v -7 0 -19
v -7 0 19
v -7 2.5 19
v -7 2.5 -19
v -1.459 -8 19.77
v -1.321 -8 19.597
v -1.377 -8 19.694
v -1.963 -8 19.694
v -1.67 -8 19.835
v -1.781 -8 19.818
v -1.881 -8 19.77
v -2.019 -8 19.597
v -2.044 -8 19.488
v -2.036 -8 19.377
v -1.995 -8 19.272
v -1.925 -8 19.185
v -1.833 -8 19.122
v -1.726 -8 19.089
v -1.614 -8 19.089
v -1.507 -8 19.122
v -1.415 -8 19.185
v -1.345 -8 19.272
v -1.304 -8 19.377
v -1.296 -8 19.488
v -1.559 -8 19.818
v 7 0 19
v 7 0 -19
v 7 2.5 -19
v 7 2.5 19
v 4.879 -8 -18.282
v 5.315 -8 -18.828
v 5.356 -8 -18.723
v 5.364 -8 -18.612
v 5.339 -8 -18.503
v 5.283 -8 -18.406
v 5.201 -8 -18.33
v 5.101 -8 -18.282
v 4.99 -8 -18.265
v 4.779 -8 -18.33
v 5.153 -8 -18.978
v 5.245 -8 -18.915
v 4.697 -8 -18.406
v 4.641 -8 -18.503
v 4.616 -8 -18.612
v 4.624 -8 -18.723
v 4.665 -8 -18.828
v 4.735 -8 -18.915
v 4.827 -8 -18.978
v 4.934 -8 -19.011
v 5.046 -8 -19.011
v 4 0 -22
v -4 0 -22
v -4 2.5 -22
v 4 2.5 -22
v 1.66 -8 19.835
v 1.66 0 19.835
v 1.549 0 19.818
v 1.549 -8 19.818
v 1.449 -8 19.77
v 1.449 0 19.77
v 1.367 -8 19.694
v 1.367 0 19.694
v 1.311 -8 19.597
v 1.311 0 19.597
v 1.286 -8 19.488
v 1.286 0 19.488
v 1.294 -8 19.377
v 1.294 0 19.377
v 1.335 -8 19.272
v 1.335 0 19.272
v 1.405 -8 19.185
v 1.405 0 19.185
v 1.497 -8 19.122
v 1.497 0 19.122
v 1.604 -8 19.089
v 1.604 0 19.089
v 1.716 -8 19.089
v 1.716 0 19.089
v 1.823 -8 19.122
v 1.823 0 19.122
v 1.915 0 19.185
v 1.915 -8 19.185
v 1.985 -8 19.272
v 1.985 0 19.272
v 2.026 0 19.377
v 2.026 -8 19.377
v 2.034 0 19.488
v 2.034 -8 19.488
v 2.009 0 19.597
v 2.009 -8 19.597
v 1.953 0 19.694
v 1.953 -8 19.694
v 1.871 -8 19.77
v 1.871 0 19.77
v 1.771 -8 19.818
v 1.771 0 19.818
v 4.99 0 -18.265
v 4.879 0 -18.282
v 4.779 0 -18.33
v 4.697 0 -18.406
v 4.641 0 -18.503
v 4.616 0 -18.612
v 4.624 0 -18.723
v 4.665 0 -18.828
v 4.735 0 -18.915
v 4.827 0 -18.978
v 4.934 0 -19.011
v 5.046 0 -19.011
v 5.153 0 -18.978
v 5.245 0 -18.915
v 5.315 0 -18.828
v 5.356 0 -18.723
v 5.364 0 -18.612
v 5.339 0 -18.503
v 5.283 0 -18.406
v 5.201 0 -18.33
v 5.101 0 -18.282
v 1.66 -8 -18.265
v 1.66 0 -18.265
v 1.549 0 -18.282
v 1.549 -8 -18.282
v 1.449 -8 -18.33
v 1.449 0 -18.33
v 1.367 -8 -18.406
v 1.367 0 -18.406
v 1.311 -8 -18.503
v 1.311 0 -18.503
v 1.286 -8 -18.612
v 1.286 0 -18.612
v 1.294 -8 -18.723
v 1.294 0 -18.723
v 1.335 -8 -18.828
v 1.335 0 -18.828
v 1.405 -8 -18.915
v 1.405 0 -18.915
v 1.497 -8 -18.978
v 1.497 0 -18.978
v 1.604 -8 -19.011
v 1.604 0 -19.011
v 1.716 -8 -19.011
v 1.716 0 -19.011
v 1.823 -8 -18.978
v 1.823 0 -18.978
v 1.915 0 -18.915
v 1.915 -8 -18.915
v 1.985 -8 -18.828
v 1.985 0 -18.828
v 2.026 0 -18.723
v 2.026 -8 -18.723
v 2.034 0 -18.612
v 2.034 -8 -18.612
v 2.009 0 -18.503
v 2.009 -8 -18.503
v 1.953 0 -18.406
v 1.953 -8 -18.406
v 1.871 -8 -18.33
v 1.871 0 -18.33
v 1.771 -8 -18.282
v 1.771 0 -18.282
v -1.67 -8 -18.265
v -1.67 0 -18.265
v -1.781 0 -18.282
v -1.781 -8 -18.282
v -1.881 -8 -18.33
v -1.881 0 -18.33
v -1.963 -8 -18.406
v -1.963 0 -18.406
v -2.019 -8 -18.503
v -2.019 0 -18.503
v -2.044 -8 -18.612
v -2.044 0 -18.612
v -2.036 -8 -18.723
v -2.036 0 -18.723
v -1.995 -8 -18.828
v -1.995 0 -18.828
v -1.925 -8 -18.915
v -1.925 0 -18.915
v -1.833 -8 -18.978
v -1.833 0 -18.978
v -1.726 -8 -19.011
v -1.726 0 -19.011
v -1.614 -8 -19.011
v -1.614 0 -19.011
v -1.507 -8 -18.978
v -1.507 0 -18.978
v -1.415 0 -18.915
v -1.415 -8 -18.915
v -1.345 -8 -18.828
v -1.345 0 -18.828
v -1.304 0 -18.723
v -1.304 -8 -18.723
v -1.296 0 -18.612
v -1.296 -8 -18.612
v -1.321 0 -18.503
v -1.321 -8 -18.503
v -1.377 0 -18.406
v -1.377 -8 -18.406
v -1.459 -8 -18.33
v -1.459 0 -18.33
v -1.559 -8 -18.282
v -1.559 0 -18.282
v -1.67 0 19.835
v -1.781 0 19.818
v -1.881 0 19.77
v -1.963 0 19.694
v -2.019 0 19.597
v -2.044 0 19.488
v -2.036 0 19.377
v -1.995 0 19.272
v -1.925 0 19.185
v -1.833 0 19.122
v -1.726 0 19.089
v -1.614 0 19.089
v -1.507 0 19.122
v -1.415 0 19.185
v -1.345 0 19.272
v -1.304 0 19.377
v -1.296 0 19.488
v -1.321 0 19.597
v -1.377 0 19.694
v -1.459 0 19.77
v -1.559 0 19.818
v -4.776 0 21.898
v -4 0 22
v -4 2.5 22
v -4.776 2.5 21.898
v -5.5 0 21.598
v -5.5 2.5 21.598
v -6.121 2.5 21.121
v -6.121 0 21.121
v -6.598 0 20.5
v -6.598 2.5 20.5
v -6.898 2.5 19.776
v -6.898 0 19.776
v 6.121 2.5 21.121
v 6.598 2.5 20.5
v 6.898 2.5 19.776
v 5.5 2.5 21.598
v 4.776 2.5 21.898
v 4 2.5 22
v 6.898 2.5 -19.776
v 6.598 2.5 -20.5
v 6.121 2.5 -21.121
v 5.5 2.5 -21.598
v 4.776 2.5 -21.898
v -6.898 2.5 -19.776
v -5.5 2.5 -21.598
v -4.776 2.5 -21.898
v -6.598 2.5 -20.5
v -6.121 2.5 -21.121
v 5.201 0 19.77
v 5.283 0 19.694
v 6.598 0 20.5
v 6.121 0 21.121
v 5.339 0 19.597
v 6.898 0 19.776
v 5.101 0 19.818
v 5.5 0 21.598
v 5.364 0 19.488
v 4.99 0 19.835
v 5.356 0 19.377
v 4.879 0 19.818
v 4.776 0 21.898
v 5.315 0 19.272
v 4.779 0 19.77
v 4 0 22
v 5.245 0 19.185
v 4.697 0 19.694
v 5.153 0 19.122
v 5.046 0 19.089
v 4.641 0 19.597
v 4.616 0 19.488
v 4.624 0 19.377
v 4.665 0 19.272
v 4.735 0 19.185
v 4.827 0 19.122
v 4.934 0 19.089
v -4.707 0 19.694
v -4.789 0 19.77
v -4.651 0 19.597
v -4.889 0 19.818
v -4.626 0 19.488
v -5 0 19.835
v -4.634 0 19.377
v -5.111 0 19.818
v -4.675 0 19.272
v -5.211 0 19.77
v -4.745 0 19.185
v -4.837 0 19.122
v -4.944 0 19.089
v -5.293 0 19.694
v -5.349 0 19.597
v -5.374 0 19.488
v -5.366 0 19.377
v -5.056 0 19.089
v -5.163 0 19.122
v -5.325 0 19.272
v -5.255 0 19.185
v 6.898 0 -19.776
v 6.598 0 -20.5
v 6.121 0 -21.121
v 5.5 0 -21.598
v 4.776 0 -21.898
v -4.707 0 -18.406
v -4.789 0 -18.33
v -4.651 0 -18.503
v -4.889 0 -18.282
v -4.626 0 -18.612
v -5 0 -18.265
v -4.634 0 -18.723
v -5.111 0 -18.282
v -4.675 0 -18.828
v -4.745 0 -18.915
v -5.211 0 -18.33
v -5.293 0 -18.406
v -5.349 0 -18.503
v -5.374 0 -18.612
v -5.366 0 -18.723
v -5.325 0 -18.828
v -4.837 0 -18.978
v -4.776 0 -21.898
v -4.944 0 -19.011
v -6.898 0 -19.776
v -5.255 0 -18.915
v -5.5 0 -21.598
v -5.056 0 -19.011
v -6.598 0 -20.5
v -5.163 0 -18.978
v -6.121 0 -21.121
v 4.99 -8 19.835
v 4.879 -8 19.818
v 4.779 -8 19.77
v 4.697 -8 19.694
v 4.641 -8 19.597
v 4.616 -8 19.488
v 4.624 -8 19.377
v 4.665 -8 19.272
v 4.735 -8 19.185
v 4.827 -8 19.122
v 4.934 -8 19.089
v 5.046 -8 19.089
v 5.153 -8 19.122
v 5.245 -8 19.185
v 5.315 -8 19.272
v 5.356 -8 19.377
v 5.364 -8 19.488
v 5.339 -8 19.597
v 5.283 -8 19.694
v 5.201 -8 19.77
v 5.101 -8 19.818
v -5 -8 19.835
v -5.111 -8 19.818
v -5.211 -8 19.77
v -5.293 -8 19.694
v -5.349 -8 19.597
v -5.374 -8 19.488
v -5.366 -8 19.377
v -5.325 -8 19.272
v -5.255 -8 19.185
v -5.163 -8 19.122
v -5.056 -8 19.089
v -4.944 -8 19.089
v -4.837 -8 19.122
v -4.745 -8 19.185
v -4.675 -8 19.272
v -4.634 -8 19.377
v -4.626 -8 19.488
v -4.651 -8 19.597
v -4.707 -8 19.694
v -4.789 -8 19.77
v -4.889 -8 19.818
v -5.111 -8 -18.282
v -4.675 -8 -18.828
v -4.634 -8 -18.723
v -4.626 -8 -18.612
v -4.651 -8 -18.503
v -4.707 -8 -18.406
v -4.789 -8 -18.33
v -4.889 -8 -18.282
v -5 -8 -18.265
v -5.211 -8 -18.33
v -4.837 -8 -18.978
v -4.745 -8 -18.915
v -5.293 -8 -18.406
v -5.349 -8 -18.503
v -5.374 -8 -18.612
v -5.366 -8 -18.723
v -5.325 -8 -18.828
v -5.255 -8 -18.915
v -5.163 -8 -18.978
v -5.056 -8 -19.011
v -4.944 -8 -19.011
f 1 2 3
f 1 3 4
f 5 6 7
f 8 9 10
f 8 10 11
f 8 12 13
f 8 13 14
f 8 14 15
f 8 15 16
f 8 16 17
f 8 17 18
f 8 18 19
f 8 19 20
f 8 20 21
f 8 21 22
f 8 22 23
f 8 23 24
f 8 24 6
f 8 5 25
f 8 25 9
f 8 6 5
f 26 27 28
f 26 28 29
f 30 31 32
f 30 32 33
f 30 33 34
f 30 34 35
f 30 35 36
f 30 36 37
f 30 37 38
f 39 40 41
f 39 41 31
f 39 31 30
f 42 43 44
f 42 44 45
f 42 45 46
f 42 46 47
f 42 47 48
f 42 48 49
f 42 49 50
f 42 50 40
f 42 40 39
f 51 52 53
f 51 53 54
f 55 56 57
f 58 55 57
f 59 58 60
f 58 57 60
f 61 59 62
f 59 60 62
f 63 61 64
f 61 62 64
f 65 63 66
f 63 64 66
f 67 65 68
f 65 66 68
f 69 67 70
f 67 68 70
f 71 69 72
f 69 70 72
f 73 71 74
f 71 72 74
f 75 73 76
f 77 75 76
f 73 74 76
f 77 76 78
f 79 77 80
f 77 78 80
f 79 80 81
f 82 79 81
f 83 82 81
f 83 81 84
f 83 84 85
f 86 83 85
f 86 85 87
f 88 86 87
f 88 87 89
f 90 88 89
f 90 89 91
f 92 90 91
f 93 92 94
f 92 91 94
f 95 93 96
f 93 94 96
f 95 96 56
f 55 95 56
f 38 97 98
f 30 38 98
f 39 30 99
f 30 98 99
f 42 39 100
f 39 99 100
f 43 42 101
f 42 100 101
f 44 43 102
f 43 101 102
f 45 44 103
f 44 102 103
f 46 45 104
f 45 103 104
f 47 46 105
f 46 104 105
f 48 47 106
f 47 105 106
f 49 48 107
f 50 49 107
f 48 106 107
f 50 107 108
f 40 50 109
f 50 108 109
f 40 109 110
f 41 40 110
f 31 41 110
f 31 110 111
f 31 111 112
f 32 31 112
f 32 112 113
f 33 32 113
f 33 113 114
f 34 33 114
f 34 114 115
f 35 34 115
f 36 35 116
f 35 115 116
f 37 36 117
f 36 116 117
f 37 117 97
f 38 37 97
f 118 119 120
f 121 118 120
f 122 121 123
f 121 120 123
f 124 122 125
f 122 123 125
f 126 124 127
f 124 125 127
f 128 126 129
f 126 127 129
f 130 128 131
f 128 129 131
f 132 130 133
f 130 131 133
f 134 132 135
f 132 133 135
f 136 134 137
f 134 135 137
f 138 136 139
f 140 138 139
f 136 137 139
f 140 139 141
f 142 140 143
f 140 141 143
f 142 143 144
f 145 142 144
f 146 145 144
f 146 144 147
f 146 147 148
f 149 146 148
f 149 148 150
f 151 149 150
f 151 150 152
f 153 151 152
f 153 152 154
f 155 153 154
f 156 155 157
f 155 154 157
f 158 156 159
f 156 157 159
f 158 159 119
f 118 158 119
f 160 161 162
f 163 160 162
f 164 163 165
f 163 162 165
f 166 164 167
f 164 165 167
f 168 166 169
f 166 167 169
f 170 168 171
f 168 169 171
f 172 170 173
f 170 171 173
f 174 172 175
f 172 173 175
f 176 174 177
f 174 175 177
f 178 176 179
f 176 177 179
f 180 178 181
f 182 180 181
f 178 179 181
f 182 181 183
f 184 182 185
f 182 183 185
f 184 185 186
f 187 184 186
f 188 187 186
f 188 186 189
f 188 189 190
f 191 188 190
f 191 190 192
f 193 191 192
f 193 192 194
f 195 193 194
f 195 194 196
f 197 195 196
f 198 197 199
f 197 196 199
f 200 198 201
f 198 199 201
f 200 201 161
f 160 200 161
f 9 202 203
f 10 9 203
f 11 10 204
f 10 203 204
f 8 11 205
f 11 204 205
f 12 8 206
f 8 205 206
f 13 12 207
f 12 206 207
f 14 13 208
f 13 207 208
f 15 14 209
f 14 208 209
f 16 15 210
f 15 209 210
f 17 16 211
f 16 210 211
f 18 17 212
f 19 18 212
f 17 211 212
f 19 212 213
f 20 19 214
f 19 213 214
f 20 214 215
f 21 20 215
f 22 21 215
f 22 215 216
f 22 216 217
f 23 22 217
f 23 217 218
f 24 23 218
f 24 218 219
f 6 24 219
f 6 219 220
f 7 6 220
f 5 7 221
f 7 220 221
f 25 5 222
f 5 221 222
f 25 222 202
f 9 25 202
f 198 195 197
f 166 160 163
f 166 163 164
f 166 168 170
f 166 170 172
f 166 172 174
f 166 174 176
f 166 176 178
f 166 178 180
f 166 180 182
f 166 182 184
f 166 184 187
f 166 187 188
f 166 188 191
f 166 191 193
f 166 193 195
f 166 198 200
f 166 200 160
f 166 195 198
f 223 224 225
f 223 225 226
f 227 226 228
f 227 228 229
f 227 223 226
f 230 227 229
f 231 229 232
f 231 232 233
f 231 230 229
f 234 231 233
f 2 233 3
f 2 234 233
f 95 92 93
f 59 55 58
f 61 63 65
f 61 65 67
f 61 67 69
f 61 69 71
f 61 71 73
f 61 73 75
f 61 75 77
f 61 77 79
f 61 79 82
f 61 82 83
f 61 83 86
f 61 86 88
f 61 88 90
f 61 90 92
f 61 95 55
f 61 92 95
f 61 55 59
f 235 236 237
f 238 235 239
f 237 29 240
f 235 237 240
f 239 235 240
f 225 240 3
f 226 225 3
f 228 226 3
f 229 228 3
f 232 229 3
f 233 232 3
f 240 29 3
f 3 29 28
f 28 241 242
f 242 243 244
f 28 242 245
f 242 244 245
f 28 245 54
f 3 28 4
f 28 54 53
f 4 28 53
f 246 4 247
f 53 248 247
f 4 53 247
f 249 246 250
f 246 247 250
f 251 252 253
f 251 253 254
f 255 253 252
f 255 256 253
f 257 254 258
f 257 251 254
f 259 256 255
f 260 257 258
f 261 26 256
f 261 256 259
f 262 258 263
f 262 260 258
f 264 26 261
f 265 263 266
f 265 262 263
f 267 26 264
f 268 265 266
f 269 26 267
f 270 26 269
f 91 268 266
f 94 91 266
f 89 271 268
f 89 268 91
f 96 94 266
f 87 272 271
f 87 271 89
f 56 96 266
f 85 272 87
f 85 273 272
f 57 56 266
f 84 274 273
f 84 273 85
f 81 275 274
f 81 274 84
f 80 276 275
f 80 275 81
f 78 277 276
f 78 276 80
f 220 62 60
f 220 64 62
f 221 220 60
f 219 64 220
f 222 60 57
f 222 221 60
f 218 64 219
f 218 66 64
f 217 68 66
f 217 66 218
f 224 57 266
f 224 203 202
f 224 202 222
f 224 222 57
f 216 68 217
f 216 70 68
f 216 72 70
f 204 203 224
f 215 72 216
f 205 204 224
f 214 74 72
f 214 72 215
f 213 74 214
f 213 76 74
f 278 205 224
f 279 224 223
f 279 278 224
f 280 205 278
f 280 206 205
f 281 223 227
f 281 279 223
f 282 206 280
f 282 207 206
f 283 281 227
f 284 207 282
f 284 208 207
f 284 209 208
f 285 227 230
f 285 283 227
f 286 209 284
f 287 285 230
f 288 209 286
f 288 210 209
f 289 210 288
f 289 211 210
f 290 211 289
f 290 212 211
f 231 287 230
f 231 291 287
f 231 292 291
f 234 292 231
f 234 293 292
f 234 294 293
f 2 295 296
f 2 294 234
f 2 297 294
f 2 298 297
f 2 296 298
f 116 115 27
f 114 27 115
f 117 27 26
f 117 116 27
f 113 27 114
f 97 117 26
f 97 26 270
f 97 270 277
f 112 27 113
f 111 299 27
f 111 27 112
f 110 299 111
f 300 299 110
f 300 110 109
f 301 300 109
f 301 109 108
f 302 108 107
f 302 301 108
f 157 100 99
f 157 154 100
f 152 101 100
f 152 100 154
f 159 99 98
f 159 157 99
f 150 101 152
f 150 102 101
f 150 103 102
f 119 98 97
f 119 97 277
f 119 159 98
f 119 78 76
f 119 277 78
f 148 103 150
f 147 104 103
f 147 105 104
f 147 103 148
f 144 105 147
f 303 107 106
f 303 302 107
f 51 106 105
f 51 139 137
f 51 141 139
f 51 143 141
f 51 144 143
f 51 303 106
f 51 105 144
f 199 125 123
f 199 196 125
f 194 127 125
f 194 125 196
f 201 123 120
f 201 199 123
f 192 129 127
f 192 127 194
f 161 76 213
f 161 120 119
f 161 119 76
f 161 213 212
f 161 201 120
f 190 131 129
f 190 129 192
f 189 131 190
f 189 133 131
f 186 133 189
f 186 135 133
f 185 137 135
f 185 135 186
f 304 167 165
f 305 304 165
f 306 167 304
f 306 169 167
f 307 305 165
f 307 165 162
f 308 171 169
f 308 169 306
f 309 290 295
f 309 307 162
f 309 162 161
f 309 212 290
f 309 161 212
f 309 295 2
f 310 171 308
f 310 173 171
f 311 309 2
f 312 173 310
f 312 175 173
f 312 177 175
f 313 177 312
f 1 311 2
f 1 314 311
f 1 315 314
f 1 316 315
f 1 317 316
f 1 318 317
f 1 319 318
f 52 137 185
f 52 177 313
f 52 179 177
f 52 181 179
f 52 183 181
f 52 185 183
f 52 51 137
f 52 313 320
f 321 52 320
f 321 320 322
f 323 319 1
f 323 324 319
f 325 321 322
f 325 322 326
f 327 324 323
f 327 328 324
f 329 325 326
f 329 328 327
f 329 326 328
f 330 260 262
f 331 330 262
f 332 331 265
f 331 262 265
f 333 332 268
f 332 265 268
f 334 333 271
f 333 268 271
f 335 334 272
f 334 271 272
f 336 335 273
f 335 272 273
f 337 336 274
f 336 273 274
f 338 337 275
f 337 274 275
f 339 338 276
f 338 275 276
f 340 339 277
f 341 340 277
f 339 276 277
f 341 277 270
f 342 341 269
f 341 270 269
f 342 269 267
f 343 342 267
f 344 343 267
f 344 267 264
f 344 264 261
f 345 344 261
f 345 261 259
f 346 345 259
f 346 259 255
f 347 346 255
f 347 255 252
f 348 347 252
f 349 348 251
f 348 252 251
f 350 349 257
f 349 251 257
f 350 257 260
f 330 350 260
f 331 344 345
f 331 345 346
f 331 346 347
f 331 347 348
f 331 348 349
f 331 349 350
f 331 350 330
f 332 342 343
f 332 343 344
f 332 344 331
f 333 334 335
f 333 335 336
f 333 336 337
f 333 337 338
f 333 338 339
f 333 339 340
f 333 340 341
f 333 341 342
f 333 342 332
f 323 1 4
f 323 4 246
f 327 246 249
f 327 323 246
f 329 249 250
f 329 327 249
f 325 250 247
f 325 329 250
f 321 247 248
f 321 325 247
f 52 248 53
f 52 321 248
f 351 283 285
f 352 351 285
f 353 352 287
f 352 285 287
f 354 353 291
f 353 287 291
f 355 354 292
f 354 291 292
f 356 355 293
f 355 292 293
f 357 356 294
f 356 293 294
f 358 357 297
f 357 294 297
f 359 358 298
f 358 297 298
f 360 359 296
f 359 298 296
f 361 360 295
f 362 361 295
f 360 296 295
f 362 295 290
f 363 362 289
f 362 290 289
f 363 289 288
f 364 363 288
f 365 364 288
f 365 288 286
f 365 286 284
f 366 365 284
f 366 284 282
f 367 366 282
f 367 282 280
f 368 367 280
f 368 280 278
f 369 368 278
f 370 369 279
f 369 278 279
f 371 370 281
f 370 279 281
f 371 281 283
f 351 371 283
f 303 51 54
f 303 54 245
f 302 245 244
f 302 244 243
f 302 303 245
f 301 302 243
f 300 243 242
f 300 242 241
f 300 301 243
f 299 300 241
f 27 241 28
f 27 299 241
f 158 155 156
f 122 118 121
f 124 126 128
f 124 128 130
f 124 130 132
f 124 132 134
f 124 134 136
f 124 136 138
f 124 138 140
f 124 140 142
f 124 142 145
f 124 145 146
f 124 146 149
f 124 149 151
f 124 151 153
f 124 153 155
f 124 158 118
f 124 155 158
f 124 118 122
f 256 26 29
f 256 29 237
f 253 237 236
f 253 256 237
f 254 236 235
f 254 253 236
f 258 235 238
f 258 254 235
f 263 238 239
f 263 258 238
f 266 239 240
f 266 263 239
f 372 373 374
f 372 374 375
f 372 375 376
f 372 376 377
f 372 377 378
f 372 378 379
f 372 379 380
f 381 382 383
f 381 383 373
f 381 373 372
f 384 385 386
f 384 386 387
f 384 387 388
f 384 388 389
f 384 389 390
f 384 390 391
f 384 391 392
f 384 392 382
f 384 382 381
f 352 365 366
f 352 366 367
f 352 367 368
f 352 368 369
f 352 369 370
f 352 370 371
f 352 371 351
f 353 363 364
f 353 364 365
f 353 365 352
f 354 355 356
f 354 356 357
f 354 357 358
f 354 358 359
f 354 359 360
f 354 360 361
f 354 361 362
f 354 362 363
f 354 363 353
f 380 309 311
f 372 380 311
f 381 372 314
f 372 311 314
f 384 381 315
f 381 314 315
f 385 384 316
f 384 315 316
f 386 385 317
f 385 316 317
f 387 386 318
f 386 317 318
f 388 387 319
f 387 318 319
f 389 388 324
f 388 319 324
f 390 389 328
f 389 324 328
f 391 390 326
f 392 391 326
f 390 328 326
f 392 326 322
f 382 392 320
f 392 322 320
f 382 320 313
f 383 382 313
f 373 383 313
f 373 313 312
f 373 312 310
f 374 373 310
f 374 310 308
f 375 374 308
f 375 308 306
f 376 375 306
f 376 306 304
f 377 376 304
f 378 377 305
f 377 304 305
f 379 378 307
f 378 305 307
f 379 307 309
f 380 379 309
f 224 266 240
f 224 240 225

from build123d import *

# Parameters (mm, degrees)
BOSS_EXTRUDE1_DEPTH = 2.5
SKETCH4_R           = 0.375
BOSS_EXTRUDE3_DEPTH = 8
LPATTERN1_COUNT     = 2
LPATTERN1_PITCH     = 38.1


with BuildPart() as part:
    # Sketch2 → Boss-Extrude1 (new body)
    with BuildSketch(Plane(origin=(0, 0, 0), x_dir=(1, 0, 0), z_dir=(0, 1, 0))):
        with BuildLine():
            Line((-4, 22), (4, 22))
            ThreePointArc((4, 22), (6.121320344, 21.121320344), (7, 19))
            Line((7, 19), (7, -19))
            ThreePointArc((7, -19), (6.121320344, -21.121320344), (4, -22))
            Line((4, -22), (-4, -22))
            ThreePointArc((-4, -22), (-6.121320344, -21.121320344), (-7, -19))
            Line((-7, -19), (-7, 19))
            ThreePointArc((-7, 19), (-6.121320344, 21.121320344), (-4, 22))
        make_face()
    extrude(amount=BOSS_EXTRUDE1_DEPTH)

    # Sketch4 → Boss-Extrude3 (add)
    with BuildSketch(Plane.XZ):
        with Locations(Location((-5, 19.46, 0), (0, 0, 90))):
            Circle(SKETCH4_R)
        with Locations(Location((-1.67, 19.46, 0), (0, 0, 90))):
            Circle(SKETCH4_R)
        with Locations(Location((1.66, 19.46, 0), (0, 0, 90))):
            Circle(SKETCH4_R)
        with Locations(Location((4.99, 19.46, 0), (0, 0, 90))):
            Circle(SKETCH4_R)
    boss_extrude3 = extrude(amount=BOSS_EXTRUDE3_DEPTH)

    # LPattern1: Boss-Extrude3 ×2
    with Locations(*[(0, 0, -i * LPATTERN1_PITCH) for i in range(1, LPATTERN1_COUNT)]):
        add(boss_extrude3)


solid = part.part
